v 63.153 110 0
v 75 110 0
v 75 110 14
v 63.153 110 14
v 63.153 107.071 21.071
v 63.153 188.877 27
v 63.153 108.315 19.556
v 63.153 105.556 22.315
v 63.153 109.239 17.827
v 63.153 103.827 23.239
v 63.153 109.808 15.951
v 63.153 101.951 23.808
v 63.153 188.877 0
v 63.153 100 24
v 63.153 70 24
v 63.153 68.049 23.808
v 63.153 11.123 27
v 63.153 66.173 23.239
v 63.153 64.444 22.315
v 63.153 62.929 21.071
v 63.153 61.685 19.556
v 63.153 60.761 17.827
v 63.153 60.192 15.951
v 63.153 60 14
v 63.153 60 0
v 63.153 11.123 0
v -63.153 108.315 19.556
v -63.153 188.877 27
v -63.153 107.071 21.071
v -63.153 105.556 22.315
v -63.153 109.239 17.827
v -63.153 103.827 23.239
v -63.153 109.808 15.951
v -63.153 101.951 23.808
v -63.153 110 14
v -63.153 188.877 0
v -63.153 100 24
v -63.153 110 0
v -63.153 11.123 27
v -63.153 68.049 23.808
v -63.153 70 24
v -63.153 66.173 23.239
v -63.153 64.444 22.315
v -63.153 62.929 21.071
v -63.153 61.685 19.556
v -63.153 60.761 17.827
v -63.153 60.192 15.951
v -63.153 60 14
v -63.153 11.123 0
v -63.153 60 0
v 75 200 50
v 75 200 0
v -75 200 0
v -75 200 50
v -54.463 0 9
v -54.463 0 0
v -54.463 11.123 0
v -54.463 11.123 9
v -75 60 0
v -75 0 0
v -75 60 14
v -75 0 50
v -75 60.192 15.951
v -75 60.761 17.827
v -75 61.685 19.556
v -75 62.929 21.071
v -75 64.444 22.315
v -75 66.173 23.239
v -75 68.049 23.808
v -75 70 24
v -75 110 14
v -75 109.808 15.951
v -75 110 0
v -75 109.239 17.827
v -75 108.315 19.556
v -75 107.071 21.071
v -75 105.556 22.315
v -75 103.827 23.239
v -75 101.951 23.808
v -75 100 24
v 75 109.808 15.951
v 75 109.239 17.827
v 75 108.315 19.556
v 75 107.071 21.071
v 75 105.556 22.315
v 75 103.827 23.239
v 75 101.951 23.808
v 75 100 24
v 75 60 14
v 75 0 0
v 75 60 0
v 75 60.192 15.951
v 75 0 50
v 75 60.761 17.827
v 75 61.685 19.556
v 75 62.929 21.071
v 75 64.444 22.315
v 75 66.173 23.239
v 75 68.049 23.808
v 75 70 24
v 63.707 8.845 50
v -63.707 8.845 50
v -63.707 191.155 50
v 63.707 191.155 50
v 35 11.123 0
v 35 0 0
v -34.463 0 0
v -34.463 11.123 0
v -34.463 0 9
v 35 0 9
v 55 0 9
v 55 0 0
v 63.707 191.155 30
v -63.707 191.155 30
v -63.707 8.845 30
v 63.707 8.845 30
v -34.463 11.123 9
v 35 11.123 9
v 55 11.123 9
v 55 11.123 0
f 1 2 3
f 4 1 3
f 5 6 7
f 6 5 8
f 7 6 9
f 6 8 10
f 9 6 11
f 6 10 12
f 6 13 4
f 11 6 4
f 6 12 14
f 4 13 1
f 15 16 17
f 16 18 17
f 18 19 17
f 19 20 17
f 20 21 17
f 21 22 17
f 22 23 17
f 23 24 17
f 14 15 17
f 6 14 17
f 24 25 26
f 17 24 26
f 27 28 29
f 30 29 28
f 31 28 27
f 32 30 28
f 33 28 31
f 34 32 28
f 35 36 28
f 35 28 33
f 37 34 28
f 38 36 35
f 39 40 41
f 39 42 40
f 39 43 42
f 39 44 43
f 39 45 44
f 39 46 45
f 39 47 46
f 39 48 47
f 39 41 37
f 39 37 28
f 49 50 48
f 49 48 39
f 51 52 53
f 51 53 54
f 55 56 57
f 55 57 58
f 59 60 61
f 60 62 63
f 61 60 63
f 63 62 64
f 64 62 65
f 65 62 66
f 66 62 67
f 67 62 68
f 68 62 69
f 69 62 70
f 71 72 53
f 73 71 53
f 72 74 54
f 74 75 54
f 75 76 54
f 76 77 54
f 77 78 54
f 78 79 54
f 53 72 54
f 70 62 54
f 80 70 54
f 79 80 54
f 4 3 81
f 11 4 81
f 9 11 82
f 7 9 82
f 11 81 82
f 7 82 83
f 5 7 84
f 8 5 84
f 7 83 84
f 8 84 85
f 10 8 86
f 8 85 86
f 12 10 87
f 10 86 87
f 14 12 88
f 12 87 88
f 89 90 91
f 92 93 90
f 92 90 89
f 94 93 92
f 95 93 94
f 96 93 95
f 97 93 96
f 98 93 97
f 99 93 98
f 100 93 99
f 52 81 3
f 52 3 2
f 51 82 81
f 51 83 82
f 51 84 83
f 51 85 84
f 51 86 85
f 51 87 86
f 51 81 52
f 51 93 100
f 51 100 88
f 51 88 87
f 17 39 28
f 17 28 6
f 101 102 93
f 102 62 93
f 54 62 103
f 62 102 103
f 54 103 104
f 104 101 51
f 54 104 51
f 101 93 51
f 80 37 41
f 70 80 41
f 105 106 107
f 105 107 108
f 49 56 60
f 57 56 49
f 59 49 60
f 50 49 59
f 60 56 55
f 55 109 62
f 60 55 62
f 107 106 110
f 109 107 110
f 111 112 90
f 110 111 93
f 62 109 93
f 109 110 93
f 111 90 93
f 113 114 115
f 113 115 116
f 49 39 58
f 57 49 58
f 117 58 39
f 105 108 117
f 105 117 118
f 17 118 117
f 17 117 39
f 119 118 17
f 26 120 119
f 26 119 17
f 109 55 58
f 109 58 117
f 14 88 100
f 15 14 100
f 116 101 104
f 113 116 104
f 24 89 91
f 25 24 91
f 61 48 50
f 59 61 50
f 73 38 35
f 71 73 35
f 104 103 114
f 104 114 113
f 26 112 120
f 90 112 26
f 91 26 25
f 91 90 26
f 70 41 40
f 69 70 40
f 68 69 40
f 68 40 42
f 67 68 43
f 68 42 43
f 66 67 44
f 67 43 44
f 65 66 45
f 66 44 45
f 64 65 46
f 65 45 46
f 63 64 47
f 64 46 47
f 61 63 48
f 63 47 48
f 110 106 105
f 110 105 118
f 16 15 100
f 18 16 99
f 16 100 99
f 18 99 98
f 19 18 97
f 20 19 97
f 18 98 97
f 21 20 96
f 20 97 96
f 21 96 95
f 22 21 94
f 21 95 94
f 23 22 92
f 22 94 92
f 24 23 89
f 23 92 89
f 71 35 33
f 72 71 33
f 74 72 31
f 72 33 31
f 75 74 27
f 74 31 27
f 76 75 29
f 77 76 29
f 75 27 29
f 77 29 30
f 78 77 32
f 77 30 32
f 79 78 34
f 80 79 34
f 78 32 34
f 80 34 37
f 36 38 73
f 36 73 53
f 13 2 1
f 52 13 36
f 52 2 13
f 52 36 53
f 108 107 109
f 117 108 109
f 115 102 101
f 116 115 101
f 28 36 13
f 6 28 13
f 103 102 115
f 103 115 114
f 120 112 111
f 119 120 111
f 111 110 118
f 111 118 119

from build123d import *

# Parameters (mm, degrees)
F0_W     = 200
F0_H     = 50
F1_DEPTH = 75
F2_W     = 127.414032
F2_H     = 182.310182
F3_DEPTH = 20
F5_W     = 126.305566
F5_H     = 177.75355
F6_DEPTH = 27
F4_W     = 20
F4_H     = 9
F7_DEPTH = 25
F9_DEPTH = 160


with BuildPart() as f1:
    # F0 (on Right) → F1 (new body, symmetric)
    with BuildSketch(Plane.YZ):
        with Locations((100, 25)):
            Rectangle(F0_W, F0_H)
    extrude(amount=F1_DEPTH, both=True)

    # F2 (on face) → F3 (cut)
    with BuildSketch(Plane.XY.offset(50)):
        with Locations((0, 100)):
            Rectangle(F2_W, F2_H)
    extrude(amount=-F3_DEPTH, mode=Mode.SUBTRACT)

    # F5 (on face) → F6 (cut)
    with BuildSketch(Plane(origin=(0, 0, 0), x_dir=(1, 0, 0), z_dir=(0, 0, -1))):
        with Locations((0, -100)):
            Rectangle(F5_W, F5_H)
    extrude(amount=-F6_DEPTH, mode=Mode.SUBTRACT)

    # F4 (on face) → F7 (cut)
    with BuildSketch(Plane.XZ):
        with Locations((45, 4.5)):
            Rectangle(F4_W, F4_H)
        with Locations((-44.462749, 4.5)):
            Rectangle(F4_W, F4_H)
    extrude(amount=-F7_DEPTH, mode=Mode.SUBTRACT)

    # F8 (on face) → F9 (cut)
    with BuildSketch(Plane.YZ.offset(75)):
        with BuildLine():
            Line((60, 14), (60, 0))
            Line((60, 0), (110, 0))
            Line((110, 0), (110, 14))
            ThreePointArc((110, 14), (107.071068, 21.071068), (100, 24))
            Line((100, 24), (70, 24))
            ThreePointArc((70, 24), (62.928932, 21.071068), (60, 14))
        make_face()
    extrude(amount=-F9_DEPTH, mode=Mode.SUBTRACT)


solid = f1.part
